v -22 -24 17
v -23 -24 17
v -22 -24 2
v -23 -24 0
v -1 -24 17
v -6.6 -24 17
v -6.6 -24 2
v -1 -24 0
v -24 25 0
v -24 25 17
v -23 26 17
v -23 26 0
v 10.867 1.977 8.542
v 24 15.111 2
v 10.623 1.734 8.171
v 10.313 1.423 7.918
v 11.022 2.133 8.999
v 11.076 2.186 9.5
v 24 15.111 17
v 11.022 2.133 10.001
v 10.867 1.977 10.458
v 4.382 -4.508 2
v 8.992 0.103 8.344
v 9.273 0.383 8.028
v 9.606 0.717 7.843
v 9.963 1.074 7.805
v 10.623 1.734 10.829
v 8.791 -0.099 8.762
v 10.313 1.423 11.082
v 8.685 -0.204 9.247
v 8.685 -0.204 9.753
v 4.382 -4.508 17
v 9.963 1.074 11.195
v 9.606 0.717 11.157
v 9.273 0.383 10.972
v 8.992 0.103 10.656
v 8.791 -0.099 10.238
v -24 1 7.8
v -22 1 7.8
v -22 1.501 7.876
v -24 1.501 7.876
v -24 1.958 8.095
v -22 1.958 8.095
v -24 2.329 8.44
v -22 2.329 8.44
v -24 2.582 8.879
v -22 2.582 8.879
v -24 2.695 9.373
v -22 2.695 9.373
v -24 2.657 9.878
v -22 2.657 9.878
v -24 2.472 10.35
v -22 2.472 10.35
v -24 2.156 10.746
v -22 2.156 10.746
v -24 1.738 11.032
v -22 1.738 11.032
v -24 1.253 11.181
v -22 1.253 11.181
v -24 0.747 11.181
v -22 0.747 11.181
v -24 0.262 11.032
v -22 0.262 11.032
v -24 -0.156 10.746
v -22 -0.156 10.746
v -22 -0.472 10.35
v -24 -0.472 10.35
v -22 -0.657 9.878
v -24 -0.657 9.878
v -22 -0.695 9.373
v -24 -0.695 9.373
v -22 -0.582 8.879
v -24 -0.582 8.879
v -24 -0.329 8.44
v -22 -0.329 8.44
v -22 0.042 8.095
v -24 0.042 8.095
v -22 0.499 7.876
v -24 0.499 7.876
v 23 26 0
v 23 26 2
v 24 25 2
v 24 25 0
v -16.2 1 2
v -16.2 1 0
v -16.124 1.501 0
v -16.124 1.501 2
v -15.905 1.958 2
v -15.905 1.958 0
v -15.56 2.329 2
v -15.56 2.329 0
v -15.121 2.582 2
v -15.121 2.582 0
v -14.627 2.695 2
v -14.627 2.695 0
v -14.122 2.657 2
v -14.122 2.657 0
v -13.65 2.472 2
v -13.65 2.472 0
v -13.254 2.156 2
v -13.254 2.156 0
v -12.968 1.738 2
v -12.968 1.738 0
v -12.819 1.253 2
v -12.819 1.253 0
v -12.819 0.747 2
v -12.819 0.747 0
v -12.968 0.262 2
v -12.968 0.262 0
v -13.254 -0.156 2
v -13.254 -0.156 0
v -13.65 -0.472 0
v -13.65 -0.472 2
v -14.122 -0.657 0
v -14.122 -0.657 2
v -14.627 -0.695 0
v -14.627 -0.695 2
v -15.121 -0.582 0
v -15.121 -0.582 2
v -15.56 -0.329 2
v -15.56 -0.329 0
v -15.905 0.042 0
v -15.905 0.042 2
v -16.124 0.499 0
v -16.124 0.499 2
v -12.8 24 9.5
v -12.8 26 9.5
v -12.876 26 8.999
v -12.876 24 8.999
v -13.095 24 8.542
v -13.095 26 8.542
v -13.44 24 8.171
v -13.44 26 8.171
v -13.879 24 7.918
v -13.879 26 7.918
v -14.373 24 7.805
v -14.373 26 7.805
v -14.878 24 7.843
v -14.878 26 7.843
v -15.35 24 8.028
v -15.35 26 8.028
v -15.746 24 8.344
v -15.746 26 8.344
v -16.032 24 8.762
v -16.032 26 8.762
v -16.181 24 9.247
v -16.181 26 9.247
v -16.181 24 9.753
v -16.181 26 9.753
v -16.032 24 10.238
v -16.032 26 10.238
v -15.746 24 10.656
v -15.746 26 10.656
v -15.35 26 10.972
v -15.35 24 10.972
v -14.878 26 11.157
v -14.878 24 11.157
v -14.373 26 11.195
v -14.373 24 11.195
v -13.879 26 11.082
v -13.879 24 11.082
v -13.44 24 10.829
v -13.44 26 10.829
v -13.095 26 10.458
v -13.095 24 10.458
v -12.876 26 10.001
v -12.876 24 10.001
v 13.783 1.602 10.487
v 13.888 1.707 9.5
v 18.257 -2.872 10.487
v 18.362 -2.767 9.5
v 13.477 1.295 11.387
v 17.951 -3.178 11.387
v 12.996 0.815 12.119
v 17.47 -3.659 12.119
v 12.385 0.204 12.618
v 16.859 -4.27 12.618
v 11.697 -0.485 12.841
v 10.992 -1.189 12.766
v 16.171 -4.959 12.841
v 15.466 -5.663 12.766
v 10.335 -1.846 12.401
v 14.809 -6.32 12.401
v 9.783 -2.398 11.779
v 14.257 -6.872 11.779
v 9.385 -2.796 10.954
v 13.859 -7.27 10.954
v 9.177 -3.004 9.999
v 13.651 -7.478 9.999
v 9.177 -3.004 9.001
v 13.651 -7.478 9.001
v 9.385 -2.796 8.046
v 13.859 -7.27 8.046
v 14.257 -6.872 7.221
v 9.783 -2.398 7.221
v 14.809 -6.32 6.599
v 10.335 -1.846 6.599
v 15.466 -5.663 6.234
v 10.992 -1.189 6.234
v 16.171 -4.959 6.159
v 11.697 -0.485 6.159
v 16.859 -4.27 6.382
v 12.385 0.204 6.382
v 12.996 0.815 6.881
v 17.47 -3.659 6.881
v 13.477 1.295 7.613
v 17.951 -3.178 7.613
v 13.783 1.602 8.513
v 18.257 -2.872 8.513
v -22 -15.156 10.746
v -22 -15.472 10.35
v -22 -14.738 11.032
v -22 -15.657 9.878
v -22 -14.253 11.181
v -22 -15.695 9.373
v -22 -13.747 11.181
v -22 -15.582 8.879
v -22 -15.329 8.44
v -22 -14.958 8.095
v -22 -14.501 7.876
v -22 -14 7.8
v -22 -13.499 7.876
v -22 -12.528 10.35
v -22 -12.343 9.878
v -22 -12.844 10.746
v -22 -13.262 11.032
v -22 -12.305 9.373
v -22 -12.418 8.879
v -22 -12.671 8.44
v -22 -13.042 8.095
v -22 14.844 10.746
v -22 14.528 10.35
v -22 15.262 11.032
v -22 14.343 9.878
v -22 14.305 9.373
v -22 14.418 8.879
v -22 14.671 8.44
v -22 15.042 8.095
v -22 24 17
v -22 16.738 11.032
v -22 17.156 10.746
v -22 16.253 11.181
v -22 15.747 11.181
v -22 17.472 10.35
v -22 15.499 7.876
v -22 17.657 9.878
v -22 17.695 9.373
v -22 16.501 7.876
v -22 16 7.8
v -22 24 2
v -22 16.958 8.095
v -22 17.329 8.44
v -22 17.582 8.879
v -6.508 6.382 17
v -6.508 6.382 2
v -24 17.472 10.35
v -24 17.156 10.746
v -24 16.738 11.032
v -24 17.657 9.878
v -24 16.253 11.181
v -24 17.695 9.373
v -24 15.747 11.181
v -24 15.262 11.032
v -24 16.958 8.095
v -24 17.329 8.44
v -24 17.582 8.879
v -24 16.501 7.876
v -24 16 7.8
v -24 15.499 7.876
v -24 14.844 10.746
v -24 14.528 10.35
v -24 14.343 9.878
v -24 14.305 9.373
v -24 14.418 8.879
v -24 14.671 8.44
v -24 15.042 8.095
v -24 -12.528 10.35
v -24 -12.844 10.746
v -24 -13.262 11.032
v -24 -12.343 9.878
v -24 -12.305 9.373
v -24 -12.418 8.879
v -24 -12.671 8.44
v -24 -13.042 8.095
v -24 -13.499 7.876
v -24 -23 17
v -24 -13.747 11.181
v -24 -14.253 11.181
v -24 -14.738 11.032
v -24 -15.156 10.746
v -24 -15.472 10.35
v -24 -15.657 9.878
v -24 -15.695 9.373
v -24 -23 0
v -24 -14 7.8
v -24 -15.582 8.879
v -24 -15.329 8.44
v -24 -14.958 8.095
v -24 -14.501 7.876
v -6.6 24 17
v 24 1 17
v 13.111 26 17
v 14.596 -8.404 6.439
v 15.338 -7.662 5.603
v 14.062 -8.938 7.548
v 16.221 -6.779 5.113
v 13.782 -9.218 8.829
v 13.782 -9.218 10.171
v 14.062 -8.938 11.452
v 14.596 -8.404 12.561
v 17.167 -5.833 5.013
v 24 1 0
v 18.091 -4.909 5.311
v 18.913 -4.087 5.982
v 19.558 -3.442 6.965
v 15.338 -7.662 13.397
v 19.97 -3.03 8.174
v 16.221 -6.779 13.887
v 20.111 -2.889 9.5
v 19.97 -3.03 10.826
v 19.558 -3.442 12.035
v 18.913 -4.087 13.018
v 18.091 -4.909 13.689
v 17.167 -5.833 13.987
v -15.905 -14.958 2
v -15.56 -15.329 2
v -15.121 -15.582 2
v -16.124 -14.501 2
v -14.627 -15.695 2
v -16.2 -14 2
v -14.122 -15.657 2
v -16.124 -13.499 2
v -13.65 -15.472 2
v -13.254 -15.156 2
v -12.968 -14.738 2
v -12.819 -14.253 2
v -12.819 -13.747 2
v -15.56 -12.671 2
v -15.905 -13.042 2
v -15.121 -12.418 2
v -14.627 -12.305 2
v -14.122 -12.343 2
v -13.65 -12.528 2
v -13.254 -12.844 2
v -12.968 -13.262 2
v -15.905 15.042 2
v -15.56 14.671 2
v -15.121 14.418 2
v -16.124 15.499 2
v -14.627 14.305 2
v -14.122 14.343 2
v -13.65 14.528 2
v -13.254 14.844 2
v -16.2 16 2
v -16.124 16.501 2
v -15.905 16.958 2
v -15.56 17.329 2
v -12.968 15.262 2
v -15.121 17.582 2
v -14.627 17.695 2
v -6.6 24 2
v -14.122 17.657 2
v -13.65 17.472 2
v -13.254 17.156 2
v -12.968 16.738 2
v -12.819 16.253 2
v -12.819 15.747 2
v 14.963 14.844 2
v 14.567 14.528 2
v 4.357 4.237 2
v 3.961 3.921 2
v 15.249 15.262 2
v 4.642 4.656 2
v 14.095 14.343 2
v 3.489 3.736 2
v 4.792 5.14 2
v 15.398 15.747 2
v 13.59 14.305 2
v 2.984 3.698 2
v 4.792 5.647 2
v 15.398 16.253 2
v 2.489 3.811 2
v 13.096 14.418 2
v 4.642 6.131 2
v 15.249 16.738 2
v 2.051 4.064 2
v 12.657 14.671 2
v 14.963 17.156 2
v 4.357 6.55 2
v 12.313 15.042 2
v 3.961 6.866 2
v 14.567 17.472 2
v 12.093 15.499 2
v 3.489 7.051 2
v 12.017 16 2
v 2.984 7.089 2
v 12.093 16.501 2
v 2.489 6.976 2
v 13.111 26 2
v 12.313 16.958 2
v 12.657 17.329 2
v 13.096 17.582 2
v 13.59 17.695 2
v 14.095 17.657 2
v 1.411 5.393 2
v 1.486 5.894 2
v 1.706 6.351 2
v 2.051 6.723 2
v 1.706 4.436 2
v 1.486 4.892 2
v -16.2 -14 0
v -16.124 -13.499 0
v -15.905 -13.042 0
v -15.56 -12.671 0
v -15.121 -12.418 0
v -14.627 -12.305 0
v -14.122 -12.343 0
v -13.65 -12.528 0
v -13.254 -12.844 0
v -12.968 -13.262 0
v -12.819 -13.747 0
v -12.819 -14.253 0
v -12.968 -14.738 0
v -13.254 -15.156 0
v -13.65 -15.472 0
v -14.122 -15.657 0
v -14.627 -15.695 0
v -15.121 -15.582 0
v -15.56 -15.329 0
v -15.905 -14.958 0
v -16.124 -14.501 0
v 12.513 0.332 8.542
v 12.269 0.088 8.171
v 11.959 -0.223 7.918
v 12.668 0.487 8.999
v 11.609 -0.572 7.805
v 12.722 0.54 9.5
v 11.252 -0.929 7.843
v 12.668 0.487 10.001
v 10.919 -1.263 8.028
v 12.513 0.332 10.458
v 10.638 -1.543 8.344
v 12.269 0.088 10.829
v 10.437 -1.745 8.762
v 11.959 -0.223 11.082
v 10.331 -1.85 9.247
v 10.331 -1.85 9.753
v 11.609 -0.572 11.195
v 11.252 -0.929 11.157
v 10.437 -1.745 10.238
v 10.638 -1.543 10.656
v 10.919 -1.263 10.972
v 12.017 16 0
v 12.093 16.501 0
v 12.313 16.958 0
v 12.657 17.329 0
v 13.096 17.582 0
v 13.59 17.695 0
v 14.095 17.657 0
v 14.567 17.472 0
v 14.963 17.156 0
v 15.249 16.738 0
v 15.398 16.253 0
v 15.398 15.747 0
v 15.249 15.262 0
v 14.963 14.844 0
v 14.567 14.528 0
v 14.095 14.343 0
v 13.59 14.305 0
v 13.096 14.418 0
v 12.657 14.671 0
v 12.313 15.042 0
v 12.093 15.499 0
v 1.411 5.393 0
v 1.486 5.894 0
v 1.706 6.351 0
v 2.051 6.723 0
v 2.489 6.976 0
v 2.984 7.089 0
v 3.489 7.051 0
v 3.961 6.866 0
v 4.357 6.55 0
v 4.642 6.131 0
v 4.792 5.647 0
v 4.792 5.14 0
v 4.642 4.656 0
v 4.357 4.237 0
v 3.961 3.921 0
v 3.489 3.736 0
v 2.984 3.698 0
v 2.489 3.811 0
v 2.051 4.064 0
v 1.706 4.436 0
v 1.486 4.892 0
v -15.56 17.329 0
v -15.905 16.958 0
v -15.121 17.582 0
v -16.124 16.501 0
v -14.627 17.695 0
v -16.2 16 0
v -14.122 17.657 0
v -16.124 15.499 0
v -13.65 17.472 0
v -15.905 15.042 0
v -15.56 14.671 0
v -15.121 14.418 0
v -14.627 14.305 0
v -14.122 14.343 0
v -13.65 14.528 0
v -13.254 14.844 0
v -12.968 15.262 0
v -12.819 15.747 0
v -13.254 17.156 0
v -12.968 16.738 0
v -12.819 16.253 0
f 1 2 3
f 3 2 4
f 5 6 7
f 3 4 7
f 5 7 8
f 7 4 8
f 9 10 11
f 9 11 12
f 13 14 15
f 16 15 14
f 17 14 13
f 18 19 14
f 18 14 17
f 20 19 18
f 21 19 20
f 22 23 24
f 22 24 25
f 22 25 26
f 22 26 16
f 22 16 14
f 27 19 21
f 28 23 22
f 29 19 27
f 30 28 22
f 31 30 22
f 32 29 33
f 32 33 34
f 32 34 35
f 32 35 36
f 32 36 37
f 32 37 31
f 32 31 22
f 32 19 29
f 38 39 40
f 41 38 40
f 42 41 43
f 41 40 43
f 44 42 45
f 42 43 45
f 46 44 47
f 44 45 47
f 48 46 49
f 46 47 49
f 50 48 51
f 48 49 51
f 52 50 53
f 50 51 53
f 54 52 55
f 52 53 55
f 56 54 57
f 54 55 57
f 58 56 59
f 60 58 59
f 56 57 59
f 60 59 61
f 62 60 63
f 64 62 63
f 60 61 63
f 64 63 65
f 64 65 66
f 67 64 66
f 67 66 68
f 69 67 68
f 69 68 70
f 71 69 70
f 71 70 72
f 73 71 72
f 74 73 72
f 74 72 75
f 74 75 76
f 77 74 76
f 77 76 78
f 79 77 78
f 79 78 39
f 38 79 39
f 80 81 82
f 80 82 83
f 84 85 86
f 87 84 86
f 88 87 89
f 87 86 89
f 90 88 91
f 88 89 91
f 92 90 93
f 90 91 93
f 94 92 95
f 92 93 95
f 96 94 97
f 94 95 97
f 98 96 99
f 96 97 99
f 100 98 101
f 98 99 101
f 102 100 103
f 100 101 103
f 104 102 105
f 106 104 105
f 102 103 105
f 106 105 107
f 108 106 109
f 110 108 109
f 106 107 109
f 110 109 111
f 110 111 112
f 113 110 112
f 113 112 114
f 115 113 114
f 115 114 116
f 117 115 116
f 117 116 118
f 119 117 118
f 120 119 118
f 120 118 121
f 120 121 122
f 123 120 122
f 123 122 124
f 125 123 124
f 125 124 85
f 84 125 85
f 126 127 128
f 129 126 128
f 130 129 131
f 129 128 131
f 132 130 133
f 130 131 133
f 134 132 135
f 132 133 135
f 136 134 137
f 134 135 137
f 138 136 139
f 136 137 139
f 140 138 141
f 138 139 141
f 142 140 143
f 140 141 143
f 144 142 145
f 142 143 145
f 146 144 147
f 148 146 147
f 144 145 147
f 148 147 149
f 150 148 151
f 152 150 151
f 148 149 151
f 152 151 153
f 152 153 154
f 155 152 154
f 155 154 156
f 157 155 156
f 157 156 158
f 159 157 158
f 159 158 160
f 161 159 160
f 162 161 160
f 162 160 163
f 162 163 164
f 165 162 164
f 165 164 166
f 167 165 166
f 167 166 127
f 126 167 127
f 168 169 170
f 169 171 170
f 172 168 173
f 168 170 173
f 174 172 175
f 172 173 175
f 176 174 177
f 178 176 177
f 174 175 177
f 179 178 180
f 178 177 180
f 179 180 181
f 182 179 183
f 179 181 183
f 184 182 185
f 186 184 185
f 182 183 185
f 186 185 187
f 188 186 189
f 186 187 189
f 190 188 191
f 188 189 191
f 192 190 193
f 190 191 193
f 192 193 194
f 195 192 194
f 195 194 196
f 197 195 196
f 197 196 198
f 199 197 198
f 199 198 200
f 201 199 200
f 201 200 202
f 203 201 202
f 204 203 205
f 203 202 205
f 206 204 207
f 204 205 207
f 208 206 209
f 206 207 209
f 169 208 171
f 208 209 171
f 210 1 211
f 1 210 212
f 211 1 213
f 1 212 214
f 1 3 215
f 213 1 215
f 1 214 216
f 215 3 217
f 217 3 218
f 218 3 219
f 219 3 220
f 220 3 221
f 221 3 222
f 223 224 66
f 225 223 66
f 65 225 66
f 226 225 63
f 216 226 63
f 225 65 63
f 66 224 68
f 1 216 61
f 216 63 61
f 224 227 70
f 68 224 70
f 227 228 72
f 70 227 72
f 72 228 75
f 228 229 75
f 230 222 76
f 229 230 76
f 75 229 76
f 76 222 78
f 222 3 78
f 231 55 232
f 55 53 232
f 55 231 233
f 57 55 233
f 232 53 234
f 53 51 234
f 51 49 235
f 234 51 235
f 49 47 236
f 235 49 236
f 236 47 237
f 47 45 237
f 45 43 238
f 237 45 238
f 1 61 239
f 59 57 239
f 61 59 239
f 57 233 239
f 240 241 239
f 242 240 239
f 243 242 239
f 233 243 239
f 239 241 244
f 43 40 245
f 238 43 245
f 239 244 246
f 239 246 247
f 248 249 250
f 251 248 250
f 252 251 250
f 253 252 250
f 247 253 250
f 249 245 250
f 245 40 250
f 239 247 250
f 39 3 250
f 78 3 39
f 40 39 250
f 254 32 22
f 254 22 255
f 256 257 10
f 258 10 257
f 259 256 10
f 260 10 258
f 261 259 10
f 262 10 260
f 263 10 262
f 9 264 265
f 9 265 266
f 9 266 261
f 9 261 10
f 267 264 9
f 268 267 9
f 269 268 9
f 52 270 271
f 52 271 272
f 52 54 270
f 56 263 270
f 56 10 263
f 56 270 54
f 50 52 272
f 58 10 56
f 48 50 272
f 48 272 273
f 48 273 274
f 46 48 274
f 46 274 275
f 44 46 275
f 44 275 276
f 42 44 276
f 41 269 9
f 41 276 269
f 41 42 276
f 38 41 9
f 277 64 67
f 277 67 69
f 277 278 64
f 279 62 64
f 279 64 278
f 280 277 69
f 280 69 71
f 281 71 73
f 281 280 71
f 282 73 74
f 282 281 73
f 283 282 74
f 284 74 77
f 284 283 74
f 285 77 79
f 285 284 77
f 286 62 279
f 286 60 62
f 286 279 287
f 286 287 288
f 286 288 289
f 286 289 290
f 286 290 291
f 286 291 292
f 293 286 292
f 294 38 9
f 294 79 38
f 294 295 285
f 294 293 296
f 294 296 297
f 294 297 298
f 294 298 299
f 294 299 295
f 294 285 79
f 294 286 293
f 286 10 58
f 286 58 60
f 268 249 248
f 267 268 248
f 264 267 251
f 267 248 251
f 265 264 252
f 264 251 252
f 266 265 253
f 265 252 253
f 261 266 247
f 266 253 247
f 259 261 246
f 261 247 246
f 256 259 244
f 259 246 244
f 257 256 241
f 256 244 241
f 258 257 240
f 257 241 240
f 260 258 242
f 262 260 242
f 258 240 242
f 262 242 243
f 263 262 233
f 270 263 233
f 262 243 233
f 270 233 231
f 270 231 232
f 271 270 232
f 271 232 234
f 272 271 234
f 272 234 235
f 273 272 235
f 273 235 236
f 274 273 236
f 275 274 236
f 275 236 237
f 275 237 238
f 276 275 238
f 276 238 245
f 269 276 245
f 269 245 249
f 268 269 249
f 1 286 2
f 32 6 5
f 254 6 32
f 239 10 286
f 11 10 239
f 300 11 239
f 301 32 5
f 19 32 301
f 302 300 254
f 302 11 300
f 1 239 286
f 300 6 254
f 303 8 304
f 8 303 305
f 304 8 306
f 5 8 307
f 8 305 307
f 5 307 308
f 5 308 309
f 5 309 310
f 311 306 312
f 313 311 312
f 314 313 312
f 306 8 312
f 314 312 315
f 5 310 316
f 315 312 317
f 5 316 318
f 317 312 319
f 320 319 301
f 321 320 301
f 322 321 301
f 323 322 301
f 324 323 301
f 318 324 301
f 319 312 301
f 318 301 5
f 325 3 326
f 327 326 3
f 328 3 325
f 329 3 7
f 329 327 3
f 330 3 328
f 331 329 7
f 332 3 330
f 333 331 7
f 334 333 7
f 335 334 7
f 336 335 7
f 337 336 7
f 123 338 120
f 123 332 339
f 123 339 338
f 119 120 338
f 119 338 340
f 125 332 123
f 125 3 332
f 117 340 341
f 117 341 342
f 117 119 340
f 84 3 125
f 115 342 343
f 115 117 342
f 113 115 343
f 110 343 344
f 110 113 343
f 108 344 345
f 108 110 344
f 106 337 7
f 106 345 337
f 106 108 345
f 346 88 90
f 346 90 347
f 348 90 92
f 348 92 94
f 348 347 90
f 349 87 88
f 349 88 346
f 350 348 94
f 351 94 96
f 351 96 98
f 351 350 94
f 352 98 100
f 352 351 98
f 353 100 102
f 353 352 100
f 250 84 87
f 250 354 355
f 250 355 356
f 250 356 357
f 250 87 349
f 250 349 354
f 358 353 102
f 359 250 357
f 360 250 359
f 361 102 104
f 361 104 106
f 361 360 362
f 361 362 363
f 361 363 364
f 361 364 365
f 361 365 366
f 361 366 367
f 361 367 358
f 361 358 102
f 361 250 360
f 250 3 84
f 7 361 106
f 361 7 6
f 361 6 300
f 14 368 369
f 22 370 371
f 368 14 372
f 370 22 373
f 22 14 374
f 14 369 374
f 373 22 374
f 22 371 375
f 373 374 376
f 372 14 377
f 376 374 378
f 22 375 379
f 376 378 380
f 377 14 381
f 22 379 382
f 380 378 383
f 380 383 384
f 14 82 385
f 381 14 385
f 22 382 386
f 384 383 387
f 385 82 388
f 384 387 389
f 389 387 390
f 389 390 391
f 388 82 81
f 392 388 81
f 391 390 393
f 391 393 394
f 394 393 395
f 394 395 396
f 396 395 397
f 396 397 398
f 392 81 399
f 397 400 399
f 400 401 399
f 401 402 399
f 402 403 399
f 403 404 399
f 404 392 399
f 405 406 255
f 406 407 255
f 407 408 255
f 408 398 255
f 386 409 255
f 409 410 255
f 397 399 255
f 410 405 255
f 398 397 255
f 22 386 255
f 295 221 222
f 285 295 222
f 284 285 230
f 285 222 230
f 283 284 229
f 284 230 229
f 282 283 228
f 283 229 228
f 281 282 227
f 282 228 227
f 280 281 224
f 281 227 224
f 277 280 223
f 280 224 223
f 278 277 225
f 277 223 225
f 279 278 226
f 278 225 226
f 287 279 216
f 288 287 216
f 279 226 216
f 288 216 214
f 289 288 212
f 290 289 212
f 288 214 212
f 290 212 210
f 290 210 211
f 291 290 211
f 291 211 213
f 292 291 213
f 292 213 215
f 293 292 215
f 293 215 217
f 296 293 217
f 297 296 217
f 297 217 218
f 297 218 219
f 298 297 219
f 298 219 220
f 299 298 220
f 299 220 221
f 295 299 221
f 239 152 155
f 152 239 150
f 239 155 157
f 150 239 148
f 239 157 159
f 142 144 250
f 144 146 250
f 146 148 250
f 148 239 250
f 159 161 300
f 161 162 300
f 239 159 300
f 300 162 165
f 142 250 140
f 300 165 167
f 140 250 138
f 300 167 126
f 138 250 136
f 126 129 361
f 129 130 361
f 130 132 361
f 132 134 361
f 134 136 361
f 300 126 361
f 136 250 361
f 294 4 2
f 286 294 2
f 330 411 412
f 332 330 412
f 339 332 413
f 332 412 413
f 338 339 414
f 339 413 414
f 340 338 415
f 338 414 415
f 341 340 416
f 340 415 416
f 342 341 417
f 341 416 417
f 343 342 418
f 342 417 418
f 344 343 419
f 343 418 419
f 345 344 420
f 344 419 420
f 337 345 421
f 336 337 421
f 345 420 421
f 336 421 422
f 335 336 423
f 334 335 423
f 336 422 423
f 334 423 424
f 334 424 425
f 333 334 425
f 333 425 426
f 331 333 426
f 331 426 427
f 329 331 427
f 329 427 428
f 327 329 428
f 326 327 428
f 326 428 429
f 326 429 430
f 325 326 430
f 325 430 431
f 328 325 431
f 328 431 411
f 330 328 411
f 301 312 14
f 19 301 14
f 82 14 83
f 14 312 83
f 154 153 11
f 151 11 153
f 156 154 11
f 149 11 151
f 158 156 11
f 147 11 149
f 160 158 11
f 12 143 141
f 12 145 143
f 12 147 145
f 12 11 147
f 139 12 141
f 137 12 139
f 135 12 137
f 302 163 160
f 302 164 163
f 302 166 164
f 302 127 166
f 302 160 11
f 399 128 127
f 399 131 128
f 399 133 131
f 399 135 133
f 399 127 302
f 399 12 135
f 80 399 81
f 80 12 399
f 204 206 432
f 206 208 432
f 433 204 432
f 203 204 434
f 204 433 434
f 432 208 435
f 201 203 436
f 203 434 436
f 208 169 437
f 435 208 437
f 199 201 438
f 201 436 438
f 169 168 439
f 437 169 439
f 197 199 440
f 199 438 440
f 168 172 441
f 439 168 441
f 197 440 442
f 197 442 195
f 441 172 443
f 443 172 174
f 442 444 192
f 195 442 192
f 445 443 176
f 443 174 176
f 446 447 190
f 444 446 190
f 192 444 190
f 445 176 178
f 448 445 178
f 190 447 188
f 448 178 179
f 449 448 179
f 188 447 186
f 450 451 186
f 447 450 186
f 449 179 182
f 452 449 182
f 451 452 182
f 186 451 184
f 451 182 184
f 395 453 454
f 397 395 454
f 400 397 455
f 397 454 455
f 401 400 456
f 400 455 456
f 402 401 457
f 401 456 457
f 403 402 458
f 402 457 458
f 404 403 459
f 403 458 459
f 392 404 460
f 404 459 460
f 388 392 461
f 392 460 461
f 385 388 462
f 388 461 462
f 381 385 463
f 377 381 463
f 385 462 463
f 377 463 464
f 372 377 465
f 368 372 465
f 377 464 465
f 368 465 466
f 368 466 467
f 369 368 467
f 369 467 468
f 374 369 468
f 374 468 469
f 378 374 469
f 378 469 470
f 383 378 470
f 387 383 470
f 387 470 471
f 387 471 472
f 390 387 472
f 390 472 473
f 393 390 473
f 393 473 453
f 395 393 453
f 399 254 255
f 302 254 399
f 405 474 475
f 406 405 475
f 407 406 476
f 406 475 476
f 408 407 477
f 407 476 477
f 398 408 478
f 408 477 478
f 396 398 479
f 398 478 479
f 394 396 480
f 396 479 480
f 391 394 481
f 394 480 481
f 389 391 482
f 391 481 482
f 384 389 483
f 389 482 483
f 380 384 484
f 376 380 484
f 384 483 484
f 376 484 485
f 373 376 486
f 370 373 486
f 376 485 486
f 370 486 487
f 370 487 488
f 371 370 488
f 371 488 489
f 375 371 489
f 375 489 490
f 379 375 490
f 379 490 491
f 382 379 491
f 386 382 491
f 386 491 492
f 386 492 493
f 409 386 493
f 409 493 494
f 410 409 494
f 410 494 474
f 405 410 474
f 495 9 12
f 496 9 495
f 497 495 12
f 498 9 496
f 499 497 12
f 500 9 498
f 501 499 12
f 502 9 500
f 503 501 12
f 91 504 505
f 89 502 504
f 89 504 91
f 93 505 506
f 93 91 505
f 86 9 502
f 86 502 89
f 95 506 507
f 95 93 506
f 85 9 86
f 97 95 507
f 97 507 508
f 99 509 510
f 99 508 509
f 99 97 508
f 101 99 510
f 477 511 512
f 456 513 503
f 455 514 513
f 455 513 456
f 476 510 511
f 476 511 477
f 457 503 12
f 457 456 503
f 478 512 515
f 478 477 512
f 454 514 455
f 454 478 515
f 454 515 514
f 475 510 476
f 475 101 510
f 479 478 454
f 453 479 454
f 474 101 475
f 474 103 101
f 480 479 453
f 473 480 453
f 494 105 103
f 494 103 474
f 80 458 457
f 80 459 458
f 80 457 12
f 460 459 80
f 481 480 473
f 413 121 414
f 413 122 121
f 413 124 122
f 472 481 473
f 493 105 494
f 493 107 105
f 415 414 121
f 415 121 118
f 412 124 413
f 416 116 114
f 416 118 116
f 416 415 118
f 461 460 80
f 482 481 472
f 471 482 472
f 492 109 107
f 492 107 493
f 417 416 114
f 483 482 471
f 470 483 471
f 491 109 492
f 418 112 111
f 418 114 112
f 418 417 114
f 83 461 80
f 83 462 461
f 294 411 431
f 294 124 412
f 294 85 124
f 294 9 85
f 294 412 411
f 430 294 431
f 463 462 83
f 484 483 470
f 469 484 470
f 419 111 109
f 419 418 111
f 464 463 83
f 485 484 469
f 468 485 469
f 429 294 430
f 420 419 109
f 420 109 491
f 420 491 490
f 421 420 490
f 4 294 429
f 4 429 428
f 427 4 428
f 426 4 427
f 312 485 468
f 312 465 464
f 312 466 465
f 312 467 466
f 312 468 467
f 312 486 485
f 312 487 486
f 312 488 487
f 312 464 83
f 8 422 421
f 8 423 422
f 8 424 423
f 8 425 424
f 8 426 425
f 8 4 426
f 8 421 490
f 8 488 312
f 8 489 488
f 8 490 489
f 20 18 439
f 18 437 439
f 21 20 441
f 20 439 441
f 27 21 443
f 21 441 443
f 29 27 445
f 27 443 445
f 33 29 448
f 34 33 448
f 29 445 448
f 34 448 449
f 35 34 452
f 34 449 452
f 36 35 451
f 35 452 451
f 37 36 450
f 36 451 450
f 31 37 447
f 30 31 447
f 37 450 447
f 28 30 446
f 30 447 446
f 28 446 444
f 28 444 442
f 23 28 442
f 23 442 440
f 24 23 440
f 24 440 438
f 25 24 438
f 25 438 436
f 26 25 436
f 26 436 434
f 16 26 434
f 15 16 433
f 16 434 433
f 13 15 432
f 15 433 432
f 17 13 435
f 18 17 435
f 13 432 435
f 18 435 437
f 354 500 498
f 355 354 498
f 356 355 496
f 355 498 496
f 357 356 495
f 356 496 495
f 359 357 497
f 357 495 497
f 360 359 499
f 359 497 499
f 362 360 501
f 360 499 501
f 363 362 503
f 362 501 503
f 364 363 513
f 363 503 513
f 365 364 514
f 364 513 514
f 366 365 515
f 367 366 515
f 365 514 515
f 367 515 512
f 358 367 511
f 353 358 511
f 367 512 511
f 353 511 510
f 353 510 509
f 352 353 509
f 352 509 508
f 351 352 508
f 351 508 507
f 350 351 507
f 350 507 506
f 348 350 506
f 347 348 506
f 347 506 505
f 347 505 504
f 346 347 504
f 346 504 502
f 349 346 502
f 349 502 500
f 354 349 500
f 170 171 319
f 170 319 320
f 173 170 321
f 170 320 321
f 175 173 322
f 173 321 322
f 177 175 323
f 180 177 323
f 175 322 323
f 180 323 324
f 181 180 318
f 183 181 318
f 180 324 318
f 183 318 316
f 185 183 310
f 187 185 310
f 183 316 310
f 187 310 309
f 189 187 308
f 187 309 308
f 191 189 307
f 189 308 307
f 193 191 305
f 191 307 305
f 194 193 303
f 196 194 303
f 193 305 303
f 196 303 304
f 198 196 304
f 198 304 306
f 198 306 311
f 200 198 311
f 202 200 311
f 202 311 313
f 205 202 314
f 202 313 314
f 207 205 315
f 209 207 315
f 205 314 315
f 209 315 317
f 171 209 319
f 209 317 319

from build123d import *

# Parameters (mm, degrees)
SKETCH1_W                = 48
SKETCH1_H                = 48
BOSS_EXTRUDE1_DEPTH      = 2
SKETCH2_W                = 2
SKETCH2_H                = 48
BOSS_EXTRUDE2_DEPTH      = 15
SKETCH3_W                = 48
SKETCH3_H                = 17
BOSS_EXTRUDE3_DEPTH      = 2
SKETCH6_W                = 28.6
SKETCH6_H                = 48
BOSS_EXTRUDE4_DEPTH      = 15
CUT_EXTRUDE2_DEPTH       = 15
M3_CLEARANCE_HOLE1_D     = 3.4
CHAMFER1_SIZE            = 1
CHAMFER2_SIZE            = 1
CHAMFER3_SIZE            = 1
M3_CLEARANCE_HOLE2_D     = 3.4
CHAMFER7_SIZE            = 25
M3_CLEARANCE_HOLE3_D     = 3.4
M3_CLEARANCE_HOLE3_DEPTH = 2


# Read off the part's stored shape, not the designer's step: CBORE for M3 SBHCS1
with BuildPart() as part:
    # Sketch1 → Boss-Extrude1 (new body)
    with BuildSketch(Plane.XY):
        Rectangle(SKETCH1_W, SKETCH1_H)
    extrude(amount=BOSS_EXTRUDE1_DEPTH)

    # Sketch2 → Boss-Extrude2 (add)
    with BuildSketch(Plane.XY.offset(2)):
        with Locations((-23, 0)):
            Rectangle(SKETCH2_W, SKETCH2_H)
        with Locations((-5.6, 0)):
            Rectangle(SKETCH2_W, SKETCH2_H)
    extrude(amount=BOSS_EXTRUDE2_DEPTH)

    # Sketch3 → Boss-Extrude3 (add)
    with BuildSketch(Plane(origin=(0, 24, 0), x_dir=(1, 0, 0), z_dir=(0, 1, 0))):
        with Locations((0, -8.5)):
            Rectangle(SKETCH3_W, SKETCH3_H)
    extrude(amount=BOSS_EXTRUDE3_DEPTH)

    # Sketch6 → Boss-Extrude4 (add)
    with BuildSketch(Plane.XY.offset(2)):
        with Locations((9.7, 0)):
            Rectangle(SKETCH6_W, SKETCH6_H)
    extrude(amount=BOSS_EXTRUDE4_DEPTH)

    # Sketch7 → Cut-Extrude2 (cut)
    with BuildSketch(Plane.XY.offset(17)):
        Polygon((24, 15.11055557), (4.381531726, -4.507912705), (-6.507912705, 6.381531726), (13.11055557, 26), (24, 26), align=None)
    extrude(amount=-CUT_EXTRUDE2_DEPTH, mode=Mode.SUBTRACT)

    # M3 Clearance Hole1 (through all)
    with Locations(Plane.XY.offset(2)):
        with Locations((-14.5, 16), (-14.5, 1), (-14.5, -14), (3.11055557, 5.393398282), (13.717157288, 16)):
            Hole(M3_CLEARANCE_HOLE1_D / 2)

    # Chamfer1
    chamfer1_edges = [part.edges().sort_by_distance(p)[0] for p in [
        (24, 26, 1),
    ]]
    chamfer(chamfer1_edges, length=CHAMFER1_SIZE)

    # Chamfer2
    chamfer2_edges = [part.edges().sort_by_distance(p)[0] for p in [
        (-24, 26, 8.5),
    ]]
    chamfer(chamfer2_edges, length=CHAMFER2_SIZE)

    # Chamfer3
    chamfer3_edges = [part.edges().sort_by_distance(p)[0] for p in [
        (-24, -24, 8.5),
    ]]
    chamfer(chamfer3_edges, length=CHAMFER3_SIZE)

    # M3 Clearance Hole2 (through all)
    with Locations(Plane(origin=(0, 24, 0), x_dir=(-1, 0, 0), z_dir=(0, -1, 0))):
        with Locations((14.5, -9.5)):
            Hole(M3_CLEARANCE_HOLE2_D / 2)

    # Chamfer7
    chamfer7_edges = [part.edges().sort_by_distance(p)[0] for p in [
        (24, -24, 8.5),
    ]]
    chamfer(chamfer7_edges, length=CHAMFER7_SIZE)

    # CBORE for M3 SBHCS1 outline → CBORE for M3 SBHCS1 (revolve, cut)
    with BuildSketch(Plane(origin=(5.428932188, 5.428932188, 9.5), x_dir=(0.707106781186549, 0.707106781186546, 0), z_dir=(0, 0, -1))):
        Polygon((0, 6.285786438), (1.7, 6.285786438), (1.7, 8.613455967), (3.35, 8.613455967), (3.35, 14.940532299), (4.5, 16.263455967), (0, 16.263455967), align=None)
    revolve(axis=Axis((5.428932188, 5.428932188, 9.5), (0.707106781186546, -0.707106781186549, 0)), mode=Mode.SUBTRACT)

    # M3 Clearance Hole3
    with Locations(Plane.ZY.offset(24)):
        with Locations((9.5, -14), (9.5, 1), (9.5, 16)):
            Hole(M3_CLEARANCE_HOLE3_D / 2, depth=M3_CLEARANCE_HOLE3_DEPTH)


solid = part.part
